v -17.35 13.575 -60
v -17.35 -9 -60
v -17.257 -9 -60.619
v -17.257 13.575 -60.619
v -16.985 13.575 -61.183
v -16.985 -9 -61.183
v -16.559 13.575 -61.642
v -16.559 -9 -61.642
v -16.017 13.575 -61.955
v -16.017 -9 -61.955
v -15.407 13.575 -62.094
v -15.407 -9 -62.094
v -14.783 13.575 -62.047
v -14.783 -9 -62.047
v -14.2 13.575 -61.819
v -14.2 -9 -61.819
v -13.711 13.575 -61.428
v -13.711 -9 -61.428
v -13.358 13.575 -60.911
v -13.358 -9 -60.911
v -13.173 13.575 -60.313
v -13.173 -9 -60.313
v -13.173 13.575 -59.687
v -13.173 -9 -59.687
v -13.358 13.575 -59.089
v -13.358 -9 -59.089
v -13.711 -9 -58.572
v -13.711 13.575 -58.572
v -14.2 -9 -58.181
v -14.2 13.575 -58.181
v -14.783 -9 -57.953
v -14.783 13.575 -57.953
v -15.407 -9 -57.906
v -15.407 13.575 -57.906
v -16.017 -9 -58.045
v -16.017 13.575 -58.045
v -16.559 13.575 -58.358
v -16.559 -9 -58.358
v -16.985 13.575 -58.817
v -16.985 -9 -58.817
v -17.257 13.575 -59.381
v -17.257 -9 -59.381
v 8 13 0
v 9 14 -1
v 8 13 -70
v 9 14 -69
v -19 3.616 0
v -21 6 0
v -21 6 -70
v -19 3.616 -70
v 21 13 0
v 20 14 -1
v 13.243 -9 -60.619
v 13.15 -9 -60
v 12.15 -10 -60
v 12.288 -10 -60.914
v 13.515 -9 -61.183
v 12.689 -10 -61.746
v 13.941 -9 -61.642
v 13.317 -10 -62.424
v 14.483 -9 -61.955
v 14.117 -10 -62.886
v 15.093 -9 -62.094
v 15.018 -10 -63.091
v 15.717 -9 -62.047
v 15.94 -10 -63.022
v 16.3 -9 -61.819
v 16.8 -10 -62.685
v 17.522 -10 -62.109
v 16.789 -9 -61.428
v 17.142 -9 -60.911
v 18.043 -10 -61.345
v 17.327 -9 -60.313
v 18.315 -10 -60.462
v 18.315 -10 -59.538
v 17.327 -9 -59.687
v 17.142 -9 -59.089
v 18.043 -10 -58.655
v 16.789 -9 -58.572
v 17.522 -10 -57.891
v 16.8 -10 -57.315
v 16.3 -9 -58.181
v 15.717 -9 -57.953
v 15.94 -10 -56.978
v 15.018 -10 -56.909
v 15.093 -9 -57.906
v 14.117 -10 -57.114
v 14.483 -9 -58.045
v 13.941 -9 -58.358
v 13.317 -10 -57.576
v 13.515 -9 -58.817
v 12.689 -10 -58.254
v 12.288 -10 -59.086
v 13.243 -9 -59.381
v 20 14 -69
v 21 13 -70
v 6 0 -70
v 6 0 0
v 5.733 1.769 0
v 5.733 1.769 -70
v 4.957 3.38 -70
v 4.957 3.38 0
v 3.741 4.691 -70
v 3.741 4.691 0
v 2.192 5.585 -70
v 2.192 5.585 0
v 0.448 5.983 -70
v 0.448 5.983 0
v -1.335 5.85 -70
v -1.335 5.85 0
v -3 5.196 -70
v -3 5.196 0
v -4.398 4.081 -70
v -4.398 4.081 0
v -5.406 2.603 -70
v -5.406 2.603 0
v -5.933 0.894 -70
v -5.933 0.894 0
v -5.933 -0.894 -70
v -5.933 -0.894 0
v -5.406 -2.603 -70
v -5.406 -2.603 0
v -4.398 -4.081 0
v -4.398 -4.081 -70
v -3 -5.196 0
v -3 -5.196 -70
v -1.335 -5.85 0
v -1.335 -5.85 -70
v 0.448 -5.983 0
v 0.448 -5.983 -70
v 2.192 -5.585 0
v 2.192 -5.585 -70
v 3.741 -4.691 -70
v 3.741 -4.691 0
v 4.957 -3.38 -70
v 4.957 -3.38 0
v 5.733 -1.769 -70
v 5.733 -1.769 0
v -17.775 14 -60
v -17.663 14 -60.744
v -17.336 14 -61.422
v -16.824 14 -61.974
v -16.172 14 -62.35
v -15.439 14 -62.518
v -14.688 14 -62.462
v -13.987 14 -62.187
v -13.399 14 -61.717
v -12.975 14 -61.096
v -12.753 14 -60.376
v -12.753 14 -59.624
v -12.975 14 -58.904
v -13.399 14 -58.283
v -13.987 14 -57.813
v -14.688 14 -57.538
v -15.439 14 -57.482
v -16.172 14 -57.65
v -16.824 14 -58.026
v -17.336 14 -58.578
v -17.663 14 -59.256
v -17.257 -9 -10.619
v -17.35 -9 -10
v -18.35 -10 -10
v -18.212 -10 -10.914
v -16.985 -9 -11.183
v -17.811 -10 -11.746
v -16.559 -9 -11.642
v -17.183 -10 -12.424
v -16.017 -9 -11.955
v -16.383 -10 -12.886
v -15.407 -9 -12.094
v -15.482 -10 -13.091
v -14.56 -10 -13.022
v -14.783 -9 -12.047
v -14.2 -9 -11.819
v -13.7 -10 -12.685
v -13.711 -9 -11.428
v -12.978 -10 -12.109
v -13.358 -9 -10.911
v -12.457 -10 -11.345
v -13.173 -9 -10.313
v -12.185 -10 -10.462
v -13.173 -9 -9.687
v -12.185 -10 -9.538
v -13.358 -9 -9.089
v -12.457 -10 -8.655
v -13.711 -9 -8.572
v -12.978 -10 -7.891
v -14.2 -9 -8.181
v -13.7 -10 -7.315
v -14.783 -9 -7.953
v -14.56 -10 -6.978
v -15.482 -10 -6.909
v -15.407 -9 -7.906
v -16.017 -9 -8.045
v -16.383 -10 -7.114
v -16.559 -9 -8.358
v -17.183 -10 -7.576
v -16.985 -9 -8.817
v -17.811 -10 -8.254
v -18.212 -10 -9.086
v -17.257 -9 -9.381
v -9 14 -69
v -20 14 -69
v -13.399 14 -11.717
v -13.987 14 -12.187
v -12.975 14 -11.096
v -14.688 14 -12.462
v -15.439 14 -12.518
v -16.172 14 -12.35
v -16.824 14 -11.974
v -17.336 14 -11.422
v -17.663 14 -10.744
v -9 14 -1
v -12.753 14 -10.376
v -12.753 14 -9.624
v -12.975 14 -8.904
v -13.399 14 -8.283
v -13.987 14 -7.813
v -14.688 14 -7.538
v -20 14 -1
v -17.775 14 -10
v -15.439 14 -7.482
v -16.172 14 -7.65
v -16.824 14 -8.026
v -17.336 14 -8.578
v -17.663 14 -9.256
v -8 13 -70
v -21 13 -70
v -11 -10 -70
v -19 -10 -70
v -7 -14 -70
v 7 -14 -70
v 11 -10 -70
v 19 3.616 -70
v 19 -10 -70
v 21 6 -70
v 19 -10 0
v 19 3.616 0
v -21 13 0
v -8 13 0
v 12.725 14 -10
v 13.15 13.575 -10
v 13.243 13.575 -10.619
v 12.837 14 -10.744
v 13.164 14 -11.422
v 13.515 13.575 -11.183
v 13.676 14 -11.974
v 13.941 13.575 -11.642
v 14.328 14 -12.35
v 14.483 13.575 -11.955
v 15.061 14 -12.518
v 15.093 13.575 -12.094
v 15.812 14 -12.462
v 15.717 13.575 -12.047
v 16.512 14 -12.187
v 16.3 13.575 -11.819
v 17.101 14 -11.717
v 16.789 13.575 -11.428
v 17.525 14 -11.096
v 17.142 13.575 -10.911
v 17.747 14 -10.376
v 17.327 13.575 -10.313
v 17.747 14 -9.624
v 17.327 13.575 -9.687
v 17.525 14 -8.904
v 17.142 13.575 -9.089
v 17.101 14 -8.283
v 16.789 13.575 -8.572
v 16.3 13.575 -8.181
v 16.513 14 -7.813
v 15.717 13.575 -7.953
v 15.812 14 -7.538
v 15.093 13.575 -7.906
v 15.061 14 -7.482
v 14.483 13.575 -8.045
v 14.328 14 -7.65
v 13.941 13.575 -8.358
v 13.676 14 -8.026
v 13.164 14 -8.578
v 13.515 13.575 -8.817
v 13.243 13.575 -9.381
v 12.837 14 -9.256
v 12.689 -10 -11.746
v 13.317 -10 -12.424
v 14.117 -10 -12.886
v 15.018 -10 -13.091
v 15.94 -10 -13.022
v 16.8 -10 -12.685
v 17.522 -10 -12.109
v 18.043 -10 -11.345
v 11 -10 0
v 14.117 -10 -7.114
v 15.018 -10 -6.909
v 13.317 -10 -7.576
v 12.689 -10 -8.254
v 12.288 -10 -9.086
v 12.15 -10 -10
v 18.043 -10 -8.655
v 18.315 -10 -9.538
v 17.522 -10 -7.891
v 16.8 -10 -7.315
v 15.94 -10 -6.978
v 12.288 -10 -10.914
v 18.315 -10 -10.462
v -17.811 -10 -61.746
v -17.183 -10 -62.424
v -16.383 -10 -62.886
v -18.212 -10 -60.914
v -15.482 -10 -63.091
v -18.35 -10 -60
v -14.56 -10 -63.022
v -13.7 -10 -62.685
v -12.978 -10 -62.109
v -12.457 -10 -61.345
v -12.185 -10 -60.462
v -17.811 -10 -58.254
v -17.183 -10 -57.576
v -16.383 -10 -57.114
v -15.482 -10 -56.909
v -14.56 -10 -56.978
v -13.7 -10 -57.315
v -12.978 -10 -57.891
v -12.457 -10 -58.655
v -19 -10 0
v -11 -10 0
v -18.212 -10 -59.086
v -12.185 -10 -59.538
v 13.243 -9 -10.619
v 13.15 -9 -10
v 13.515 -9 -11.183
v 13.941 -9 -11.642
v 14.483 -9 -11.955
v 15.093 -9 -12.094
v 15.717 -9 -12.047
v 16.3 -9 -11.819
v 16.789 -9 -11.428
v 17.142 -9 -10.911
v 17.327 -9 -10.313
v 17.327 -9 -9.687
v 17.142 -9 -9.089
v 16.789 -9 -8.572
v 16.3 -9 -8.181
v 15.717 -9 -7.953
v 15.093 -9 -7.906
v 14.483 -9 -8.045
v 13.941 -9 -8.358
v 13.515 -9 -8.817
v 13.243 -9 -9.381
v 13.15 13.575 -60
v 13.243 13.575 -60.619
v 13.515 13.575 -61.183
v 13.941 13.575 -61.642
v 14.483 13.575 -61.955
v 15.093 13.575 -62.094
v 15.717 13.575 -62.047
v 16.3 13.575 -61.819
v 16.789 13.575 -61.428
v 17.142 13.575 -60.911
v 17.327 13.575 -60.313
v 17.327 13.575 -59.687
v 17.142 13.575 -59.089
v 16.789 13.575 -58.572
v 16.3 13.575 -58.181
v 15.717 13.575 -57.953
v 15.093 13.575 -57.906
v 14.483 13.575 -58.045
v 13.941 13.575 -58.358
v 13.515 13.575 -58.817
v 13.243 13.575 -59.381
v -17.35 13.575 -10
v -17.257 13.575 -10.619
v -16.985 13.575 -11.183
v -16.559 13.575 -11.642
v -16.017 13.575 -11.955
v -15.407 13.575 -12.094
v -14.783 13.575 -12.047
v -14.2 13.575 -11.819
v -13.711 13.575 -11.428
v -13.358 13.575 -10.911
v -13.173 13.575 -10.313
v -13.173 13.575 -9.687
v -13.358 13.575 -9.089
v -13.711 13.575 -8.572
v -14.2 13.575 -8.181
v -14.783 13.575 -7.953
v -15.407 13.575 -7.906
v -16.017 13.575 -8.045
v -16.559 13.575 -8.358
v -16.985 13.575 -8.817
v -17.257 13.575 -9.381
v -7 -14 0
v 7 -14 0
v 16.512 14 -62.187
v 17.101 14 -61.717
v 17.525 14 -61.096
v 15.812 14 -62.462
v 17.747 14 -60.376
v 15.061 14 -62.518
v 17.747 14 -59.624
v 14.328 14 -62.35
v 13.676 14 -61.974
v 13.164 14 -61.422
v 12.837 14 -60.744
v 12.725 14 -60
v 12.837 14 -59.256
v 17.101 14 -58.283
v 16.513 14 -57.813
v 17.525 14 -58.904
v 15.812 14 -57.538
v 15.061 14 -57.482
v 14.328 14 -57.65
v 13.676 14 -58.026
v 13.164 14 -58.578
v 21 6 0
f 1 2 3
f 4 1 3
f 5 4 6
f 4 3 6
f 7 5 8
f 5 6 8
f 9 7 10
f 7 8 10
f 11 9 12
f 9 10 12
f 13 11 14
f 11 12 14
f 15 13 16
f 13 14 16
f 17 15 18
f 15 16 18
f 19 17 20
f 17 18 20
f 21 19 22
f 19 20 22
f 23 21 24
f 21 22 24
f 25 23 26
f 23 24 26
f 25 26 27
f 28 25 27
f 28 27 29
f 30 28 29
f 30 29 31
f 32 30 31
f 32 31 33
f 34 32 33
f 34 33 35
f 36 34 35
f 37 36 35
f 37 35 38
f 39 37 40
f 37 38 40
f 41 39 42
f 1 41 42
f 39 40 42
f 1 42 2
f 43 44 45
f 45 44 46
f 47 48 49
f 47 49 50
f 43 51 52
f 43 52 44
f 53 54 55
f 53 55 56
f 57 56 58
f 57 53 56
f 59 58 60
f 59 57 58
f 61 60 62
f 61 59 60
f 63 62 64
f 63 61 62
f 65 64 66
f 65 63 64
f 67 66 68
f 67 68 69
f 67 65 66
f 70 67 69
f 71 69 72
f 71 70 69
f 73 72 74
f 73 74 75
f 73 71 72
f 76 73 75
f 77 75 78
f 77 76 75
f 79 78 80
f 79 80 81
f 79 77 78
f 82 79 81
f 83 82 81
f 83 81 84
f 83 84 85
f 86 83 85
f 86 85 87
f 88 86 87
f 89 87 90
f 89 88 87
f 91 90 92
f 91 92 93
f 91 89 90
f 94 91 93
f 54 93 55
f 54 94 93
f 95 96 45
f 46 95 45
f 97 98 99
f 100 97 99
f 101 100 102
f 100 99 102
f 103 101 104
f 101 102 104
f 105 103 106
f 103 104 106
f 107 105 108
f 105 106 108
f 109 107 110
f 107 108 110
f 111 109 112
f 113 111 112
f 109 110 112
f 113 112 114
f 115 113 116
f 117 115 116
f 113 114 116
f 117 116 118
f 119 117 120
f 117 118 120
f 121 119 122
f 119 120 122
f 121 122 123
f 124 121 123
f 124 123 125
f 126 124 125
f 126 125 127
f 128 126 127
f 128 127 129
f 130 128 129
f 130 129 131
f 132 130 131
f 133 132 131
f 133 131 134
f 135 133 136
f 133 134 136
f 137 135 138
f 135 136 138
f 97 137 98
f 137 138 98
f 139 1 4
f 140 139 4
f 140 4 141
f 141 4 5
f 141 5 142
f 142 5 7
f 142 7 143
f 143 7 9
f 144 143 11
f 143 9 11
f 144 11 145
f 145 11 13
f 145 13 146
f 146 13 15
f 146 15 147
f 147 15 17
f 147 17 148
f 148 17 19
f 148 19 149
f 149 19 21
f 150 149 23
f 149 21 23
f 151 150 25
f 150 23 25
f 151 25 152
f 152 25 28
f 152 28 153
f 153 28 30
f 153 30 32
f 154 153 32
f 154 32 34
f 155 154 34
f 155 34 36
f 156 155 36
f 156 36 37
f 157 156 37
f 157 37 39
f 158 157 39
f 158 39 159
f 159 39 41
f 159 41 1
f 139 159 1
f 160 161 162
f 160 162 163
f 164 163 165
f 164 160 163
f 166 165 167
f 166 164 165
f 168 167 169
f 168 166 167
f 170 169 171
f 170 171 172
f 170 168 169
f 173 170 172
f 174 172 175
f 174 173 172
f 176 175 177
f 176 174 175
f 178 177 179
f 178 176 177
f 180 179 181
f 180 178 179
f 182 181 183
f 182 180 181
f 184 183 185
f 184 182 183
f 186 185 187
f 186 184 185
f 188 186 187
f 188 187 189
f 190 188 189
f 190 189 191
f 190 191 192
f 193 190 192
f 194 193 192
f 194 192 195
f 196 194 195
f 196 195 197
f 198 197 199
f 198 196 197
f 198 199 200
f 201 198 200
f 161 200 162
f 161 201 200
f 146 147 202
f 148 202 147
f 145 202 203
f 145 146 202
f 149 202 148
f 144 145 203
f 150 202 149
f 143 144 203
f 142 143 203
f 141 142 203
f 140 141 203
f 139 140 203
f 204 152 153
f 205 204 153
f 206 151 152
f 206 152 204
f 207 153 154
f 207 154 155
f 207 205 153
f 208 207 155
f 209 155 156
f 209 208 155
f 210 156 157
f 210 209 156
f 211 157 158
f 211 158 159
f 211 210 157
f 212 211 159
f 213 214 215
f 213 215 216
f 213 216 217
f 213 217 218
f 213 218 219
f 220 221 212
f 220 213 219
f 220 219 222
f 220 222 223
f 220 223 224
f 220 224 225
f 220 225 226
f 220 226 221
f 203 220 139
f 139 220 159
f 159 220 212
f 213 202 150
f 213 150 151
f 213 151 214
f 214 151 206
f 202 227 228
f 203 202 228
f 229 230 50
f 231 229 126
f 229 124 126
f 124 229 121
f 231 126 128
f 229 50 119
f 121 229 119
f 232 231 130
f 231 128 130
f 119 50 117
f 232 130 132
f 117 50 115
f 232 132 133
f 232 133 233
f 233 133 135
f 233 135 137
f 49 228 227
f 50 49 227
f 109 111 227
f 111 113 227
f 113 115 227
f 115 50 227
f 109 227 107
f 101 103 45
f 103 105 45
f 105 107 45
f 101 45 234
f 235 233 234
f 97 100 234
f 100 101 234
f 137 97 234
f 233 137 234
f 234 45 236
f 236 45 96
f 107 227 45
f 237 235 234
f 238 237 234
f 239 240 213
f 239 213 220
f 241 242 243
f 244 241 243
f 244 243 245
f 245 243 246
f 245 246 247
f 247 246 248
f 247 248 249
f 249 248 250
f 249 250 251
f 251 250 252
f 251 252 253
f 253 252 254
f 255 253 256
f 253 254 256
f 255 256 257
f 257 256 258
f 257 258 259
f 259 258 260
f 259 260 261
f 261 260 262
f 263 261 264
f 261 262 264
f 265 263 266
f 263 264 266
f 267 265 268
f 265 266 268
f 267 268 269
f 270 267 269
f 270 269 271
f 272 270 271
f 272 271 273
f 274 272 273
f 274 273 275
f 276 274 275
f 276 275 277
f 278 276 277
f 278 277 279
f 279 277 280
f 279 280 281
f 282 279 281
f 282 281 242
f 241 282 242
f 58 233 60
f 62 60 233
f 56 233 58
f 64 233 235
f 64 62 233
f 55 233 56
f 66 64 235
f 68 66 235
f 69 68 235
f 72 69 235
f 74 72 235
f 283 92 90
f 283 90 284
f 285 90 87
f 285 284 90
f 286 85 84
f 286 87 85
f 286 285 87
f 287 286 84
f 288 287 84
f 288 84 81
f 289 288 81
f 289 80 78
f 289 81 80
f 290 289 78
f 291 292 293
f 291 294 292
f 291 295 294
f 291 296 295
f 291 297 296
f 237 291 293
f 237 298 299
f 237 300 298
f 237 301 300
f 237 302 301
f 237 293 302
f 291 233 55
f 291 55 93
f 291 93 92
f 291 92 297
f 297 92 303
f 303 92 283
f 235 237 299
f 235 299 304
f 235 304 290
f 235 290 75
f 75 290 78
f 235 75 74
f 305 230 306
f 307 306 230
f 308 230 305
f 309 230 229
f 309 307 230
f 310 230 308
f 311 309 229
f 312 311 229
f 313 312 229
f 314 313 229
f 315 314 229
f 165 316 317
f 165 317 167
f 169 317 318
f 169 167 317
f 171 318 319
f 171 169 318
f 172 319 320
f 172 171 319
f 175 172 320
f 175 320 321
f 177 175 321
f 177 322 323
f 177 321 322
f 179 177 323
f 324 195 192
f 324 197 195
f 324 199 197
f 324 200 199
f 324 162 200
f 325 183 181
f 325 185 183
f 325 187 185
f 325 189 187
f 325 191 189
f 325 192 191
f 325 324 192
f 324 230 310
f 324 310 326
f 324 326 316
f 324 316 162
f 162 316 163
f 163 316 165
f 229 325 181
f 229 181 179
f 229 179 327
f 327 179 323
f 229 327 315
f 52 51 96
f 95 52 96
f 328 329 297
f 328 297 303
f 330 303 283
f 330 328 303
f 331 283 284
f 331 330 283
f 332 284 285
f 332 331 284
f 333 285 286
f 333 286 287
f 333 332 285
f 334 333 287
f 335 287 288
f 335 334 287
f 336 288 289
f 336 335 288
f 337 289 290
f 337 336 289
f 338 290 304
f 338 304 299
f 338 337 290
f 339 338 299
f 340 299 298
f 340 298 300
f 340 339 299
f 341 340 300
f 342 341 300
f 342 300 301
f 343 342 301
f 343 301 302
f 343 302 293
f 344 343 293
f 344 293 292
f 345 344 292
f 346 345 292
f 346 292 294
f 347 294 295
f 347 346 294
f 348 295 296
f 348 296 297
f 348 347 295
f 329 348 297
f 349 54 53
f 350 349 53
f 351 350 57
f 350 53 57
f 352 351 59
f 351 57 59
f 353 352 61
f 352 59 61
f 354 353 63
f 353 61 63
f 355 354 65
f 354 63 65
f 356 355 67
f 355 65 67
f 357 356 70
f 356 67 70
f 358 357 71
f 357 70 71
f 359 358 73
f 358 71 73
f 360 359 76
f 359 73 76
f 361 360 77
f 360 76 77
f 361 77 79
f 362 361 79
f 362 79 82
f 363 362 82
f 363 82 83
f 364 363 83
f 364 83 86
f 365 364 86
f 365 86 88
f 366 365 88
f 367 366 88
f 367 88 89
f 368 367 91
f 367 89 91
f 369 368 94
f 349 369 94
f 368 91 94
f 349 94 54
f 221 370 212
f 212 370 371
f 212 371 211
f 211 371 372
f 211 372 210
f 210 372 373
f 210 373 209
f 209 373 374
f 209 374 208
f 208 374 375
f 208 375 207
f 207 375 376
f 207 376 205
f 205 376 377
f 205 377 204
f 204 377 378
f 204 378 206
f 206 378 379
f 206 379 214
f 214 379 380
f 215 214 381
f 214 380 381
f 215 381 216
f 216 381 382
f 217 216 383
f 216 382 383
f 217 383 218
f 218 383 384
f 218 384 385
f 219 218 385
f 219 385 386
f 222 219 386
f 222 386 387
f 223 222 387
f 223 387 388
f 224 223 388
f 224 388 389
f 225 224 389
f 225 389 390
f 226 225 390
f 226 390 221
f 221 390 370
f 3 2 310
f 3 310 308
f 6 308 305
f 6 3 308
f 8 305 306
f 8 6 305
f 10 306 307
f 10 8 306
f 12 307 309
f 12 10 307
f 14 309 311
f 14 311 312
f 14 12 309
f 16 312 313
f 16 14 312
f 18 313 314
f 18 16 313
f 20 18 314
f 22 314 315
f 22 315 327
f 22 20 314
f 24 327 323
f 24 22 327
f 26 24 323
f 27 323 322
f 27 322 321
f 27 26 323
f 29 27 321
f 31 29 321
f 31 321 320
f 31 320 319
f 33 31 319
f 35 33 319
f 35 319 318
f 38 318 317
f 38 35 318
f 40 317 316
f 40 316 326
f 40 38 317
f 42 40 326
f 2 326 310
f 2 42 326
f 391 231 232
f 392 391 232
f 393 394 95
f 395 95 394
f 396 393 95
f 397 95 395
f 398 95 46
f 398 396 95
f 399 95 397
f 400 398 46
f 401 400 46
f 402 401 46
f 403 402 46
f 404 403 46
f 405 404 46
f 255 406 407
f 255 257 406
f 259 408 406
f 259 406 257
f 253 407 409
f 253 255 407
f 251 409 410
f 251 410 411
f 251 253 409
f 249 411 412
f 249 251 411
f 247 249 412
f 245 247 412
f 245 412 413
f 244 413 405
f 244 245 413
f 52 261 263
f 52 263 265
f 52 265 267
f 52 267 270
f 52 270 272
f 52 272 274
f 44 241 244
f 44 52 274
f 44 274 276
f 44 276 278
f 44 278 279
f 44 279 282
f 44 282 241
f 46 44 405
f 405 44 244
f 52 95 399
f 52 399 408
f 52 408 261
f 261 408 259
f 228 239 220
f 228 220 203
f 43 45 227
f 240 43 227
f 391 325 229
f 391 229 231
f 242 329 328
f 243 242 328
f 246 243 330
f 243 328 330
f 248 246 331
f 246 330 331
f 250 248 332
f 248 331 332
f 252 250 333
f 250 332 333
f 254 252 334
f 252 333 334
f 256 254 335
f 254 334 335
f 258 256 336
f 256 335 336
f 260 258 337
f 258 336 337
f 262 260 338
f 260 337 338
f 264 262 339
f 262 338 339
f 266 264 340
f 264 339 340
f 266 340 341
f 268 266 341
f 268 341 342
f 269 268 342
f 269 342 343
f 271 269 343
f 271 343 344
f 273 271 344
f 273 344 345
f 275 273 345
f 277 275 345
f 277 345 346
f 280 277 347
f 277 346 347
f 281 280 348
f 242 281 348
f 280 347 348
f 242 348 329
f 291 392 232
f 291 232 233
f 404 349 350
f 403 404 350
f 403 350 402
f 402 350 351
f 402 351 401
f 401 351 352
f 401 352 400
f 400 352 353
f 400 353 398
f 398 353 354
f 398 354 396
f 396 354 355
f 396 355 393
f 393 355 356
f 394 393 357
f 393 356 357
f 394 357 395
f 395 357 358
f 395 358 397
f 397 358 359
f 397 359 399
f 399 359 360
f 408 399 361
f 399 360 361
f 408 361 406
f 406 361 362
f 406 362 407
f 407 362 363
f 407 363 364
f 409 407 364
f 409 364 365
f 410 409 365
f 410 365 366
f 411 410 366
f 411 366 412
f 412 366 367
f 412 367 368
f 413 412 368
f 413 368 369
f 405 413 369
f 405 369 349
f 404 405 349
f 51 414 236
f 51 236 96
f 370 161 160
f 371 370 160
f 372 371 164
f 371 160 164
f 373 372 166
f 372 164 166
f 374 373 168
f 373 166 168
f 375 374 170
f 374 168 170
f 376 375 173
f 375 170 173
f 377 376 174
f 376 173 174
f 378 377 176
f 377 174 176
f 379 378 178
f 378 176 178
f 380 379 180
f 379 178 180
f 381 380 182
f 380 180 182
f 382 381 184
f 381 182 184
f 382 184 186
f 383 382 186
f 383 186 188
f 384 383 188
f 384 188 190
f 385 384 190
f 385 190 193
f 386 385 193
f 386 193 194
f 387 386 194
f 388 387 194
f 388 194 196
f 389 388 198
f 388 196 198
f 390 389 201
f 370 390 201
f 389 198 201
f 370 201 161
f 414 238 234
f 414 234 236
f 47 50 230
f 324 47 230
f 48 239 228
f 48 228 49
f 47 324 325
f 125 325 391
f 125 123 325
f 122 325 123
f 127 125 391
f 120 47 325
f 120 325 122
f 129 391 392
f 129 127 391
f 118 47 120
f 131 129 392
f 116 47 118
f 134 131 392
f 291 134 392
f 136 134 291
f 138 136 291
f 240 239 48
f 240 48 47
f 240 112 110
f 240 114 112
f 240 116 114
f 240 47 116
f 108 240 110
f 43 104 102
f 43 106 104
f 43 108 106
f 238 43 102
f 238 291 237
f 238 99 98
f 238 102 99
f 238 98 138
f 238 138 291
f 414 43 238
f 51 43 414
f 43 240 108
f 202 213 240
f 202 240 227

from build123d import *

# Parameters (mm, degrees)
ESBO_O1_R                       = 6
RESSALTO_EXTRUS_O1_DEPTH        = 70
CHANFRO1_SIZE                   = 1
FURO_ROSCADO_DE_M51_D           = 4.2
FURO_ROSCADO_DE_M51_CSINK_D     = 5.05
FURO_ROSCADO_DE_M51_CSINK_ANGLE = 90
CHANFRO2_SIZE                   = 1


with BuildPart() as part:
    # Esboço1 → Ressalto-extrusão1 (new body)
    with BuildSketch(Plane.XY):
        Polygon((8, 13), (-8, 13), (-8, 14), (-21, 14), (-21, 6), (-19, 3.616492815), (-19, -10), (-11, -10), (-7, -14), (7, -14), (11, -10), (19, -10), (19, 3.616492815), (21, 6), (21, 14), (8, 14), align=None)
        Circle(ESBO_O1_R, mode=Mode.SUBTRACT)
    extrude(amount=-RESSALTO_EXTRUS_O1_DEPTH)

    # Chanfro1
    chanfro1_edges = [part.edges().sort_by_distance(p)[0] for p in [
        (14.5, 14, -70),
        (21, 14, -35),
        (14.5, 14, 0),
        (8, 14, -35),
        (-14.5, 14, -70),
        (-21, 14, -35),
        (-14.5, 14, 0),
        (-8, 14, -35),
    ]]
    chamfer(chanfro1_edges, length=CHANFRO1_SIZE - 0.0001)  # a hair under: the kernel refuses the full size

    # Furo roscado de M51 (through all)
    with Locations(Plane(origin=(0, 14, 0), x_dir=(1, 0, 0), z_dir=(0, 1, 0))):
        with Locations((15.25, 10), (15.25, 60), (-15.25, 60), (-15.25, 10)):
            CounterSinkHole(FURO_ROSCADO_DE_M51_D / 2, FURO_ROSCADO_DE_M51_CSINK_D / 2, counter_sink_angle=FURO_ROSCADO_DE_M51_CSINK_ANGLE)

    # Chanfro2
    chanfro2_edges = [part.edges().sort_by_distance(p)[0] for p in [
        (-13.15, -10, -10),
        (-13.15, -10, -60),
        (17.35, -10, -60),
        (17.35, -10, -10),
    ]]
    chamfer(chanfro2_edges, length=CHANFRO2_SIZE)


solid = part.part
